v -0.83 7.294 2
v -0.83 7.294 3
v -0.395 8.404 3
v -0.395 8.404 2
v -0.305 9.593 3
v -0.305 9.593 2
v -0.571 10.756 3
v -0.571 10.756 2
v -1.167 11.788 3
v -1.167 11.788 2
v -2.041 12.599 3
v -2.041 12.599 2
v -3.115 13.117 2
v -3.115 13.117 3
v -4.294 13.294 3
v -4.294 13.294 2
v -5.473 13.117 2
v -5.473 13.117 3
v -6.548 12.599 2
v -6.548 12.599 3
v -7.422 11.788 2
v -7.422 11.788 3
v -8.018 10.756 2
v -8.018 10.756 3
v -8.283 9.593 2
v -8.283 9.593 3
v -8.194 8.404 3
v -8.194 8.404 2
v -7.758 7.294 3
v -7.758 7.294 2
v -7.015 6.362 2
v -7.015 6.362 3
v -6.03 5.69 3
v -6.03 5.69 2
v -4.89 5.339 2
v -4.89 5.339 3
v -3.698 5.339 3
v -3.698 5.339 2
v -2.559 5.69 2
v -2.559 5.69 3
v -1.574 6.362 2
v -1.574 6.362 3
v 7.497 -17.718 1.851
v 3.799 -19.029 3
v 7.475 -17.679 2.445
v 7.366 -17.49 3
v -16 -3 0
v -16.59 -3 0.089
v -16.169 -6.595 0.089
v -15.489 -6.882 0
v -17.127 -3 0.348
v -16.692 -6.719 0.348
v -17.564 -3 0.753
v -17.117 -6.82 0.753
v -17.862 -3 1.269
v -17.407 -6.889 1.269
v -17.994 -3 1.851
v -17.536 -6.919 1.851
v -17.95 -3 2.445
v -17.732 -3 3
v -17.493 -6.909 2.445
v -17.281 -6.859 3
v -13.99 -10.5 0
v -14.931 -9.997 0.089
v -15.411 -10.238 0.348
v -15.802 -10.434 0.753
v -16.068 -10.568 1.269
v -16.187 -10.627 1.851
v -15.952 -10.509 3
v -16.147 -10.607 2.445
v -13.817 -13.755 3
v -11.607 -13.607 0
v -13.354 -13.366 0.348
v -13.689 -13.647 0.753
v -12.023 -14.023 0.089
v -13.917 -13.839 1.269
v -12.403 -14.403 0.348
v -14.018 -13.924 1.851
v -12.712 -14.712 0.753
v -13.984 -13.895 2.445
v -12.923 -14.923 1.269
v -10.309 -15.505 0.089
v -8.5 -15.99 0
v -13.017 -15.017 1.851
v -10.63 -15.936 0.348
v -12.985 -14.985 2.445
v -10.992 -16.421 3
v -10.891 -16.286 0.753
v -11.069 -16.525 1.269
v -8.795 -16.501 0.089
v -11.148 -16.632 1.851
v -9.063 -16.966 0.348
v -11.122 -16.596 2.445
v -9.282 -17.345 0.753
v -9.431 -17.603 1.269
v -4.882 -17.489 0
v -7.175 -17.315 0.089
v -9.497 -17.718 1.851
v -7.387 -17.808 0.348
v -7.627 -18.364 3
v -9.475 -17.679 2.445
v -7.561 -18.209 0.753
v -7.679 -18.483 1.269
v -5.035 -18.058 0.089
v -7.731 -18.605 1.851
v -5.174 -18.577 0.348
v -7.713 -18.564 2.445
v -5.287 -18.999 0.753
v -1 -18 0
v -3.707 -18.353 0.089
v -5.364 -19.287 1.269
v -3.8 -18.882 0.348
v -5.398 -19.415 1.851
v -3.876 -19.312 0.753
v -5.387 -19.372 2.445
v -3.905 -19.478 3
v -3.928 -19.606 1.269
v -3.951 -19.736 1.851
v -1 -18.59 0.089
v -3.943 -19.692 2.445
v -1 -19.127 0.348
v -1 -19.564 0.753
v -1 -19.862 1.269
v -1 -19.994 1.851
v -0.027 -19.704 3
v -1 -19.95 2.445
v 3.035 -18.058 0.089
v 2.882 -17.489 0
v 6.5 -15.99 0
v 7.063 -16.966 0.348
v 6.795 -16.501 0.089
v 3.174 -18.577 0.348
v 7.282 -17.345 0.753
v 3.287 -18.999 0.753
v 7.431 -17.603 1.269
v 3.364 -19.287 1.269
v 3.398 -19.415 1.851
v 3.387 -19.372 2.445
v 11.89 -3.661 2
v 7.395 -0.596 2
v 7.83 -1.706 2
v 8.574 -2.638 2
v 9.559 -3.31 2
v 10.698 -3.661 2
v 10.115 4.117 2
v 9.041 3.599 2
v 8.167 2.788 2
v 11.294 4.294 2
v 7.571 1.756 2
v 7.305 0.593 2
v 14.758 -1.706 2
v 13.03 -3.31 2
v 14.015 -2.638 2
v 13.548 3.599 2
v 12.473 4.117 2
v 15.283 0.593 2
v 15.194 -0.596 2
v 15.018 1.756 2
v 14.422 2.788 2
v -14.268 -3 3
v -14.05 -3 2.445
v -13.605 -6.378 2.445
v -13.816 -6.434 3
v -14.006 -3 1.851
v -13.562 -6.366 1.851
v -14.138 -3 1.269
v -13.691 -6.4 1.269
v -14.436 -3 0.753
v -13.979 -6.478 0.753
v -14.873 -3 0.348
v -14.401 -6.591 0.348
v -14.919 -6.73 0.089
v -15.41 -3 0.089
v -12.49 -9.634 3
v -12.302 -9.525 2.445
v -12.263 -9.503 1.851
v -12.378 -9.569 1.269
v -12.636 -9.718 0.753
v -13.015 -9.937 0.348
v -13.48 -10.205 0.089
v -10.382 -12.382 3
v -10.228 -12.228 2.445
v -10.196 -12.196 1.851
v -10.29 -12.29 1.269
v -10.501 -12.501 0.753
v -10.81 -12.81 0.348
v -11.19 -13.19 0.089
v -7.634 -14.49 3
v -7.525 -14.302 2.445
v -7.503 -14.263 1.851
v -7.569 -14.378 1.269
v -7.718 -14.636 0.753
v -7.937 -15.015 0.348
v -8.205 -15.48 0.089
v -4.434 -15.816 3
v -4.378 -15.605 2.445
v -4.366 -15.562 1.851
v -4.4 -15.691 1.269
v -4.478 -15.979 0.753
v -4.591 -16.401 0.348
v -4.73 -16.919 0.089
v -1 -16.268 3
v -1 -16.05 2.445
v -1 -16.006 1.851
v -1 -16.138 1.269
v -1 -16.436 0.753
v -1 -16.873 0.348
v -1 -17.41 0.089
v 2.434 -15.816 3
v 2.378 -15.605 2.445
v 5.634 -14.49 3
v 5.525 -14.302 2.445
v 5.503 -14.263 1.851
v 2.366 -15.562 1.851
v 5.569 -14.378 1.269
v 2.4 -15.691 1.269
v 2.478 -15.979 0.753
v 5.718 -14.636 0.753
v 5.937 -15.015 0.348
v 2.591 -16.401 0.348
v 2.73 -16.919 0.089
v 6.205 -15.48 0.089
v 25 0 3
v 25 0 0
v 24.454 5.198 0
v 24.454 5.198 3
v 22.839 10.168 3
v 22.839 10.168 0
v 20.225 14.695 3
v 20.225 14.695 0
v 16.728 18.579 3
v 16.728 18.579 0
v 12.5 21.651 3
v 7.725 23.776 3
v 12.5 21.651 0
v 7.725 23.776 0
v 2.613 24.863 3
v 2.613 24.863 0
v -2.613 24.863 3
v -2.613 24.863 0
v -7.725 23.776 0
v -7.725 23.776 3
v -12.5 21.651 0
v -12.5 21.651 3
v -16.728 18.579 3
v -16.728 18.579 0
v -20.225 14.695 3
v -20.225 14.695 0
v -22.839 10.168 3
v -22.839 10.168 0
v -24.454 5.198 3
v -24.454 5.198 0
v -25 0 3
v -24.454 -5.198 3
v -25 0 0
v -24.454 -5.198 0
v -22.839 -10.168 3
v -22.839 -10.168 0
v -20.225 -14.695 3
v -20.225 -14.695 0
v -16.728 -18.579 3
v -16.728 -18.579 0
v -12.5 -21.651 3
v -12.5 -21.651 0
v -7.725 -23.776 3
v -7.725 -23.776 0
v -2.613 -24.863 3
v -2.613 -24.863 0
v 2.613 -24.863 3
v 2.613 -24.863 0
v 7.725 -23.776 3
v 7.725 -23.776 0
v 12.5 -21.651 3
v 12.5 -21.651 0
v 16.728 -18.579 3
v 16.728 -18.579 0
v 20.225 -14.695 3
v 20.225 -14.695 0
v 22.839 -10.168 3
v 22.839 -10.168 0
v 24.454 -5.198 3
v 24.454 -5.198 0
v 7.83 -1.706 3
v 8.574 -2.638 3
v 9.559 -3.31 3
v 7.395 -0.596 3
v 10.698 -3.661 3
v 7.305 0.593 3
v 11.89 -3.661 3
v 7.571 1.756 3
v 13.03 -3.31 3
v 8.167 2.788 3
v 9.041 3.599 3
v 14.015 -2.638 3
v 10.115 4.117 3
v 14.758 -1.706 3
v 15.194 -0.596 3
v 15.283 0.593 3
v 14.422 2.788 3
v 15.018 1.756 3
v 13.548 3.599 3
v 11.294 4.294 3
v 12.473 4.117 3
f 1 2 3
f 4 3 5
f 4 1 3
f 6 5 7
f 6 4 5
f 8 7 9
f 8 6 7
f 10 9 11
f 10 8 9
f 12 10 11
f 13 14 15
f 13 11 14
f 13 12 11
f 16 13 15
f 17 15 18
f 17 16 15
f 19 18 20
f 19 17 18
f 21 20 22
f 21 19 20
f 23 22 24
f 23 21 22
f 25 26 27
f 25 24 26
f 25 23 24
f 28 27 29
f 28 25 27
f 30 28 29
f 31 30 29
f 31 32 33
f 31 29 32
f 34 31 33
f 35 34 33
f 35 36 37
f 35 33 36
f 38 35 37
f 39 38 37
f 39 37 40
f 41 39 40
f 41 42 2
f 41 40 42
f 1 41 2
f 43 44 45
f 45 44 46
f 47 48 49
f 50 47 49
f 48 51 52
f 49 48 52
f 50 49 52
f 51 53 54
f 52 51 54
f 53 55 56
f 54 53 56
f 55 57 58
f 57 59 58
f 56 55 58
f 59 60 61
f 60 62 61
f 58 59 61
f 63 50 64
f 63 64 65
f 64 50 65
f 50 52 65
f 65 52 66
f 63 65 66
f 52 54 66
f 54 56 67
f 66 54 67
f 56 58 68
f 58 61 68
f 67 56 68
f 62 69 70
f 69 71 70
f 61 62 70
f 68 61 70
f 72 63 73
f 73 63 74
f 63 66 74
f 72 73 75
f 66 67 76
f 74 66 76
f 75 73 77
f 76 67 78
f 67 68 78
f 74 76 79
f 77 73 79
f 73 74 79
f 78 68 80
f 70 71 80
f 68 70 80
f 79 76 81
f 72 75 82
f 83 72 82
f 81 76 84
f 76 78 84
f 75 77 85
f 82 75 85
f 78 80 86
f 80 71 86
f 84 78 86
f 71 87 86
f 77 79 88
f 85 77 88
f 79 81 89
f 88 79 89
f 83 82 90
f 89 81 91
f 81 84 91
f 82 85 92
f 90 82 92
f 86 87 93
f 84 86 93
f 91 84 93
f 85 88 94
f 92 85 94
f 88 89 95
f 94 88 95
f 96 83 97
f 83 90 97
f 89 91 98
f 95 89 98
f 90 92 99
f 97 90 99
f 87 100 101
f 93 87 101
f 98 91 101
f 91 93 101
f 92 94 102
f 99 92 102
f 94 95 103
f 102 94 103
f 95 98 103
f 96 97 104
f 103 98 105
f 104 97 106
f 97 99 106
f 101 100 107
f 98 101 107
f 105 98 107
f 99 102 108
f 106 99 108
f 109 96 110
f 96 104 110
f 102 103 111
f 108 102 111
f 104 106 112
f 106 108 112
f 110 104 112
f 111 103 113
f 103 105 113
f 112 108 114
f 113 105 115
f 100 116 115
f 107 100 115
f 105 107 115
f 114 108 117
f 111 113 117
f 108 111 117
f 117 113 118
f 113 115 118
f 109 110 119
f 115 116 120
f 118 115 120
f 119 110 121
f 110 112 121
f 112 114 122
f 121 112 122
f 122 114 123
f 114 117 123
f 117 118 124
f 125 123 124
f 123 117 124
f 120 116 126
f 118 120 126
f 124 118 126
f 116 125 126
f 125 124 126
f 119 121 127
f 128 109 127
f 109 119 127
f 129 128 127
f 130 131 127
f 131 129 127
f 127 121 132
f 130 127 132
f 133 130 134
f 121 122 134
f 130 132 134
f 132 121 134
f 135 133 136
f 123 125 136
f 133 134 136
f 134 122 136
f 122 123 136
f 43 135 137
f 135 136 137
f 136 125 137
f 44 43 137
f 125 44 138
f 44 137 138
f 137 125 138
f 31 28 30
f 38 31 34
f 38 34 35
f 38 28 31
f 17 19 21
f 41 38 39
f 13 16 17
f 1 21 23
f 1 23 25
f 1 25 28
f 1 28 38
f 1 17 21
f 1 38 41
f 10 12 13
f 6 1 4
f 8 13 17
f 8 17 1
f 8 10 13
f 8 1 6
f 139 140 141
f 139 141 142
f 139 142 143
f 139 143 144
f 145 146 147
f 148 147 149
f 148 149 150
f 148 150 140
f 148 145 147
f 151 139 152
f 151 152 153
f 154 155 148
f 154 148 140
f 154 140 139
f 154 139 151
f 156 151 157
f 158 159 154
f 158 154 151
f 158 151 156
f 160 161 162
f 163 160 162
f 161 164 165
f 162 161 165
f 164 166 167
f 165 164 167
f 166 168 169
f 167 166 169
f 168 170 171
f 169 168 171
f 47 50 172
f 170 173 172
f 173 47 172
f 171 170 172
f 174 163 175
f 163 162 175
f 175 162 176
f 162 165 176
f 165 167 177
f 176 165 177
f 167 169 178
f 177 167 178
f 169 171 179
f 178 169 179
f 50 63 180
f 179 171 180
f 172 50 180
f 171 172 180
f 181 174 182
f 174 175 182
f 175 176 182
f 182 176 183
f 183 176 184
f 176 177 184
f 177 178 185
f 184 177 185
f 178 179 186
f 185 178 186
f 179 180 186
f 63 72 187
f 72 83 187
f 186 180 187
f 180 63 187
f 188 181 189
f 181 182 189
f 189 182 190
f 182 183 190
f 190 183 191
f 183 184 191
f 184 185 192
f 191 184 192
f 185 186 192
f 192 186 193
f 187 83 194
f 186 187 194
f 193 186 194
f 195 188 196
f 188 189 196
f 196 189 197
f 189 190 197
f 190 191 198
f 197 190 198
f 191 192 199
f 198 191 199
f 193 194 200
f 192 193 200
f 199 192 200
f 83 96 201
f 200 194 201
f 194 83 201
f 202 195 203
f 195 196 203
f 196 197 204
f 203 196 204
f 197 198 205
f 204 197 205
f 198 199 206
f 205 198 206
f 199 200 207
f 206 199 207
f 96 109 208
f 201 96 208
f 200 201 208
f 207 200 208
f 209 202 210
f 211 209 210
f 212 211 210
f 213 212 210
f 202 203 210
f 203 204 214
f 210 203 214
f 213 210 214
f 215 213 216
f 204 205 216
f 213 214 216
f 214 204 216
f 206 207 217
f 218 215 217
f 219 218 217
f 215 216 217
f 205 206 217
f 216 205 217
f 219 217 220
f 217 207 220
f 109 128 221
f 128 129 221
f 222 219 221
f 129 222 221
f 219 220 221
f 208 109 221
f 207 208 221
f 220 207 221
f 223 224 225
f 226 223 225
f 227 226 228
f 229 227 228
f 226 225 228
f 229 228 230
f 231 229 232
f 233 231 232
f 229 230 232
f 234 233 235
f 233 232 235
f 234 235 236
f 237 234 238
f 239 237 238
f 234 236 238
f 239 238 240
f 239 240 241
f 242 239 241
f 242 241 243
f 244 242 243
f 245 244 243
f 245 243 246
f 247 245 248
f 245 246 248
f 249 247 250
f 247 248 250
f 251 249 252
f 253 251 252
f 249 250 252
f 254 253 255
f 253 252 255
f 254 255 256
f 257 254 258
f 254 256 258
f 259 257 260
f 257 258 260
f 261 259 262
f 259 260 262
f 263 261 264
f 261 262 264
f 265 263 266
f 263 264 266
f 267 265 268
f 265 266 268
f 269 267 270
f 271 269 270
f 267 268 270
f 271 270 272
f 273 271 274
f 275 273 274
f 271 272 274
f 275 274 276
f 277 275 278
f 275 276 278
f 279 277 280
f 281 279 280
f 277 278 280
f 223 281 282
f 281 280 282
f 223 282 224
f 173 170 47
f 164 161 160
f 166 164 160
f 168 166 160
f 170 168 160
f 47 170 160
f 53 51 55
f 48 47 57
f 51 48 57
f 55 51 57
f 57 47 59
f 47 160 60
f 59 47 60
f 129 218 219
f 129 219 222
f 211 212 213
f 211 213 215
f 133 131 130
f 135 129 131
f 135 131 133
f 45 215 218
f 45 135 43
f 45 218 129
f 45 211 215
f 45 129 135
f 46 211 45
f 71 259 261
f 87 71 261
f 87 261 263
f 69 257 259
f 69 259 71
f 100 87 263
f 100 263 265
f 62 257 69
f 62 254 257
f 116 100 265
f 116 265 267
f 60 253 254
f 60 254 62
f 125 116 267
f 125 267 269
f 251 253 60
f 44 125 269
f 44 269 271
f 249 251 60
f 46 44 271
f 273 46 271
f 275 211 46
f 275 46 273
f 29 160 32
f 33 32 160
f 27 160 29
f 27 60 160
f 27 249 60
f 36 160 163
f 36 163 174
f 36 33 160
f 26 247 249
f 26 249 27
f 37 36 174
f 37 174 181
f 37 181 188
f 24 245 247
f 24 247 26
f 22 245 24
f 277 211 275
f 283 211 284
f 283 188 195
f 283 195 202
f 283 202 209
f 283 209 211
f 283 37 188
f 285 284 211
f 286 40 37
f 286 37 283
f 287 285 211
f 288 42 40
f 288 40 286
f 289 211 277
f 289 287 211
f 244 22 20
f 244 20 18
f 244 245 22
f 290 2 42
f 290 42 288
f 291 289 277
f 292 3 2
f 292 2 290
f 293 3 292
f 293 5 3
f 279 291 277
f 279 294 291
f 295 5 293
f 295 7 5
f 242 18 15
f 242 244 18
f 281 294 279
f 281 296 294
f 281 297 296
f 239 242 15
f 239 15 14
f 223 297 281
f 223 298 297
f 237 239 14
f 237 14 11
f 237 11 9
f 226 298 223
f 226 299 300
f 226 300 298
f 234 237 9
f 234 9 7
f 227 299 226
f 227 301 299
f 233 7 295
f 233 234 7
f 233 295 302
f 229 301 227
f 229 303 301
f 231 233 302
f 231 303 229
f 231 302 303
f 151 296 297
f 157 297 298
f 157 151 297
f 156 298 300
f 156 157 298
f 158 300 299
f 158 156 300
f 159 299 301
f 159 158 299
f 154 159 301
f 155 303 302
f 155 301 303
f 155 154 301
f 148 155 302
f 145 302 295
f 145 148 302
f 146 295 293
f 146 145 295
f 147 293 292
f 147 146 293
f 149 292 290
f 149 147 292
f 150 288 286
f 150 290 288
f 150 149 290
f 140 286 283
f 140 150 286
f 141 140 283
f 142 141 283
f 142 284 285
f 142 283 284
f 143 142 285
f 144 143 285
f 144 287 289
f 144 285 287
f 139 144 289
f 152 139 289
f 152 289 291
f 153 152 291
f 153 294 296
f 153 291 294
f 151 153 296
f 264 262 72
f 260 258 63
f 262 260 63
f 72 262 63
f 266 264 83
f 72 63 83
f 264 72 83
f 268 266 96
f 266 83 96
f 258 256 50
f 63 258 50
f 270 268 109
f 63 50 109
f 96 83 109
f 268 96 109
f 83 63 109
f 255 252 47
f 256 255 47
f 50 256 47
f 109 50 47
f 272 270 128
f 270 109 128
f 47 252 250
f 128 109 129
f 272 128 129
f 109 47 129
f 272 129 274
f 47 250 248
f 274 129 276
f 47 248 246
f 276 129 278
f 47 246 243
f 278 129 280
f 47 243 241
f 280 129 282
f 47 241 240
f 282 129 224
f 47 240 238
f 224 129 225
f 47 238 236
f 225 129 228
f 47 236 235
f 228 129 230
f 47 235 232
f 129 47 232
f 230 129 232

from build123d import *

# Parameters (mm, degrees)
CYLINDER001_R          = 4
CYLINDER001_DEPTH      = 2
CYLINDER002_R          = 4
CYLINDER002_DEPTH      = 2
FUSION_PLACEMENT_ANGLE = 30
TORUS_R                = 2
TORUS_ANGLE            = 120
CYLINDER_R             = 25
CYLINDER_DEPTH         = 3


with BuildPart() as ull1:
    # Cylinder001 → Cylinder001 (new body)
    with BuildSketch(Plane(origin=(9, 9, 2), x_dir=(1, 0, 0), z_dir=(0, 0, 1))):
        Circle(CYLINDER001_R)
    extrude(amount=CYLINDER001_DEPTH)


with BuildPart() as fusion:
    # Cylinder002 → Cylinder002 (new body)
    with BuildSketch(Plane(origin=(-9, 9, 2), x_dir=(1, 0, 0), z_dir=(0, 0, 1))):
        Circle(CYLINDER002_R)
    extrude(amount=CYLINDER002_DEPTH)

    # Fusion: union ull1
    add(ull1.part)


with BuildPart() as fusion_1:
    # Fusion placement: moved
    add(fusion.part.moved(Location((-1, -3, 0))).rotate(Axis((-1, -3, 0), (0, 0, -1)), FUSION_PLACEMENT_ANGLE))


with BuildPart() as torus:
    # Torus → Torus (revolve)
    with BuildSketch(Plane(origin=(-1, -3, 2), x_dir=(-1, 0, 0), z_dir=(0, 1, 0))):
        with Locations((15, 0)):
            Circle(TORUS_R)
    revolve(axis=Axis((-1, -3, 2), (0, 0, 1)), revolution_arc=TORUS_ANGLE)


with BuildPart() as cut001:
    # Cylinder → Cylinder (new body)
    with BuildSketch(Plane.XY):
        Circle(CYLINDER_R)
    extrude(amount=CYLINDER_DEPTH)

    # Cut: cut Torus
    add(torus.part, mode=Mode.SUBTRACT)

    # Cut001: cut Fusion
    add(fusion_1.part, mode=Mode.SUBTRACT)


solid = cut001.part
